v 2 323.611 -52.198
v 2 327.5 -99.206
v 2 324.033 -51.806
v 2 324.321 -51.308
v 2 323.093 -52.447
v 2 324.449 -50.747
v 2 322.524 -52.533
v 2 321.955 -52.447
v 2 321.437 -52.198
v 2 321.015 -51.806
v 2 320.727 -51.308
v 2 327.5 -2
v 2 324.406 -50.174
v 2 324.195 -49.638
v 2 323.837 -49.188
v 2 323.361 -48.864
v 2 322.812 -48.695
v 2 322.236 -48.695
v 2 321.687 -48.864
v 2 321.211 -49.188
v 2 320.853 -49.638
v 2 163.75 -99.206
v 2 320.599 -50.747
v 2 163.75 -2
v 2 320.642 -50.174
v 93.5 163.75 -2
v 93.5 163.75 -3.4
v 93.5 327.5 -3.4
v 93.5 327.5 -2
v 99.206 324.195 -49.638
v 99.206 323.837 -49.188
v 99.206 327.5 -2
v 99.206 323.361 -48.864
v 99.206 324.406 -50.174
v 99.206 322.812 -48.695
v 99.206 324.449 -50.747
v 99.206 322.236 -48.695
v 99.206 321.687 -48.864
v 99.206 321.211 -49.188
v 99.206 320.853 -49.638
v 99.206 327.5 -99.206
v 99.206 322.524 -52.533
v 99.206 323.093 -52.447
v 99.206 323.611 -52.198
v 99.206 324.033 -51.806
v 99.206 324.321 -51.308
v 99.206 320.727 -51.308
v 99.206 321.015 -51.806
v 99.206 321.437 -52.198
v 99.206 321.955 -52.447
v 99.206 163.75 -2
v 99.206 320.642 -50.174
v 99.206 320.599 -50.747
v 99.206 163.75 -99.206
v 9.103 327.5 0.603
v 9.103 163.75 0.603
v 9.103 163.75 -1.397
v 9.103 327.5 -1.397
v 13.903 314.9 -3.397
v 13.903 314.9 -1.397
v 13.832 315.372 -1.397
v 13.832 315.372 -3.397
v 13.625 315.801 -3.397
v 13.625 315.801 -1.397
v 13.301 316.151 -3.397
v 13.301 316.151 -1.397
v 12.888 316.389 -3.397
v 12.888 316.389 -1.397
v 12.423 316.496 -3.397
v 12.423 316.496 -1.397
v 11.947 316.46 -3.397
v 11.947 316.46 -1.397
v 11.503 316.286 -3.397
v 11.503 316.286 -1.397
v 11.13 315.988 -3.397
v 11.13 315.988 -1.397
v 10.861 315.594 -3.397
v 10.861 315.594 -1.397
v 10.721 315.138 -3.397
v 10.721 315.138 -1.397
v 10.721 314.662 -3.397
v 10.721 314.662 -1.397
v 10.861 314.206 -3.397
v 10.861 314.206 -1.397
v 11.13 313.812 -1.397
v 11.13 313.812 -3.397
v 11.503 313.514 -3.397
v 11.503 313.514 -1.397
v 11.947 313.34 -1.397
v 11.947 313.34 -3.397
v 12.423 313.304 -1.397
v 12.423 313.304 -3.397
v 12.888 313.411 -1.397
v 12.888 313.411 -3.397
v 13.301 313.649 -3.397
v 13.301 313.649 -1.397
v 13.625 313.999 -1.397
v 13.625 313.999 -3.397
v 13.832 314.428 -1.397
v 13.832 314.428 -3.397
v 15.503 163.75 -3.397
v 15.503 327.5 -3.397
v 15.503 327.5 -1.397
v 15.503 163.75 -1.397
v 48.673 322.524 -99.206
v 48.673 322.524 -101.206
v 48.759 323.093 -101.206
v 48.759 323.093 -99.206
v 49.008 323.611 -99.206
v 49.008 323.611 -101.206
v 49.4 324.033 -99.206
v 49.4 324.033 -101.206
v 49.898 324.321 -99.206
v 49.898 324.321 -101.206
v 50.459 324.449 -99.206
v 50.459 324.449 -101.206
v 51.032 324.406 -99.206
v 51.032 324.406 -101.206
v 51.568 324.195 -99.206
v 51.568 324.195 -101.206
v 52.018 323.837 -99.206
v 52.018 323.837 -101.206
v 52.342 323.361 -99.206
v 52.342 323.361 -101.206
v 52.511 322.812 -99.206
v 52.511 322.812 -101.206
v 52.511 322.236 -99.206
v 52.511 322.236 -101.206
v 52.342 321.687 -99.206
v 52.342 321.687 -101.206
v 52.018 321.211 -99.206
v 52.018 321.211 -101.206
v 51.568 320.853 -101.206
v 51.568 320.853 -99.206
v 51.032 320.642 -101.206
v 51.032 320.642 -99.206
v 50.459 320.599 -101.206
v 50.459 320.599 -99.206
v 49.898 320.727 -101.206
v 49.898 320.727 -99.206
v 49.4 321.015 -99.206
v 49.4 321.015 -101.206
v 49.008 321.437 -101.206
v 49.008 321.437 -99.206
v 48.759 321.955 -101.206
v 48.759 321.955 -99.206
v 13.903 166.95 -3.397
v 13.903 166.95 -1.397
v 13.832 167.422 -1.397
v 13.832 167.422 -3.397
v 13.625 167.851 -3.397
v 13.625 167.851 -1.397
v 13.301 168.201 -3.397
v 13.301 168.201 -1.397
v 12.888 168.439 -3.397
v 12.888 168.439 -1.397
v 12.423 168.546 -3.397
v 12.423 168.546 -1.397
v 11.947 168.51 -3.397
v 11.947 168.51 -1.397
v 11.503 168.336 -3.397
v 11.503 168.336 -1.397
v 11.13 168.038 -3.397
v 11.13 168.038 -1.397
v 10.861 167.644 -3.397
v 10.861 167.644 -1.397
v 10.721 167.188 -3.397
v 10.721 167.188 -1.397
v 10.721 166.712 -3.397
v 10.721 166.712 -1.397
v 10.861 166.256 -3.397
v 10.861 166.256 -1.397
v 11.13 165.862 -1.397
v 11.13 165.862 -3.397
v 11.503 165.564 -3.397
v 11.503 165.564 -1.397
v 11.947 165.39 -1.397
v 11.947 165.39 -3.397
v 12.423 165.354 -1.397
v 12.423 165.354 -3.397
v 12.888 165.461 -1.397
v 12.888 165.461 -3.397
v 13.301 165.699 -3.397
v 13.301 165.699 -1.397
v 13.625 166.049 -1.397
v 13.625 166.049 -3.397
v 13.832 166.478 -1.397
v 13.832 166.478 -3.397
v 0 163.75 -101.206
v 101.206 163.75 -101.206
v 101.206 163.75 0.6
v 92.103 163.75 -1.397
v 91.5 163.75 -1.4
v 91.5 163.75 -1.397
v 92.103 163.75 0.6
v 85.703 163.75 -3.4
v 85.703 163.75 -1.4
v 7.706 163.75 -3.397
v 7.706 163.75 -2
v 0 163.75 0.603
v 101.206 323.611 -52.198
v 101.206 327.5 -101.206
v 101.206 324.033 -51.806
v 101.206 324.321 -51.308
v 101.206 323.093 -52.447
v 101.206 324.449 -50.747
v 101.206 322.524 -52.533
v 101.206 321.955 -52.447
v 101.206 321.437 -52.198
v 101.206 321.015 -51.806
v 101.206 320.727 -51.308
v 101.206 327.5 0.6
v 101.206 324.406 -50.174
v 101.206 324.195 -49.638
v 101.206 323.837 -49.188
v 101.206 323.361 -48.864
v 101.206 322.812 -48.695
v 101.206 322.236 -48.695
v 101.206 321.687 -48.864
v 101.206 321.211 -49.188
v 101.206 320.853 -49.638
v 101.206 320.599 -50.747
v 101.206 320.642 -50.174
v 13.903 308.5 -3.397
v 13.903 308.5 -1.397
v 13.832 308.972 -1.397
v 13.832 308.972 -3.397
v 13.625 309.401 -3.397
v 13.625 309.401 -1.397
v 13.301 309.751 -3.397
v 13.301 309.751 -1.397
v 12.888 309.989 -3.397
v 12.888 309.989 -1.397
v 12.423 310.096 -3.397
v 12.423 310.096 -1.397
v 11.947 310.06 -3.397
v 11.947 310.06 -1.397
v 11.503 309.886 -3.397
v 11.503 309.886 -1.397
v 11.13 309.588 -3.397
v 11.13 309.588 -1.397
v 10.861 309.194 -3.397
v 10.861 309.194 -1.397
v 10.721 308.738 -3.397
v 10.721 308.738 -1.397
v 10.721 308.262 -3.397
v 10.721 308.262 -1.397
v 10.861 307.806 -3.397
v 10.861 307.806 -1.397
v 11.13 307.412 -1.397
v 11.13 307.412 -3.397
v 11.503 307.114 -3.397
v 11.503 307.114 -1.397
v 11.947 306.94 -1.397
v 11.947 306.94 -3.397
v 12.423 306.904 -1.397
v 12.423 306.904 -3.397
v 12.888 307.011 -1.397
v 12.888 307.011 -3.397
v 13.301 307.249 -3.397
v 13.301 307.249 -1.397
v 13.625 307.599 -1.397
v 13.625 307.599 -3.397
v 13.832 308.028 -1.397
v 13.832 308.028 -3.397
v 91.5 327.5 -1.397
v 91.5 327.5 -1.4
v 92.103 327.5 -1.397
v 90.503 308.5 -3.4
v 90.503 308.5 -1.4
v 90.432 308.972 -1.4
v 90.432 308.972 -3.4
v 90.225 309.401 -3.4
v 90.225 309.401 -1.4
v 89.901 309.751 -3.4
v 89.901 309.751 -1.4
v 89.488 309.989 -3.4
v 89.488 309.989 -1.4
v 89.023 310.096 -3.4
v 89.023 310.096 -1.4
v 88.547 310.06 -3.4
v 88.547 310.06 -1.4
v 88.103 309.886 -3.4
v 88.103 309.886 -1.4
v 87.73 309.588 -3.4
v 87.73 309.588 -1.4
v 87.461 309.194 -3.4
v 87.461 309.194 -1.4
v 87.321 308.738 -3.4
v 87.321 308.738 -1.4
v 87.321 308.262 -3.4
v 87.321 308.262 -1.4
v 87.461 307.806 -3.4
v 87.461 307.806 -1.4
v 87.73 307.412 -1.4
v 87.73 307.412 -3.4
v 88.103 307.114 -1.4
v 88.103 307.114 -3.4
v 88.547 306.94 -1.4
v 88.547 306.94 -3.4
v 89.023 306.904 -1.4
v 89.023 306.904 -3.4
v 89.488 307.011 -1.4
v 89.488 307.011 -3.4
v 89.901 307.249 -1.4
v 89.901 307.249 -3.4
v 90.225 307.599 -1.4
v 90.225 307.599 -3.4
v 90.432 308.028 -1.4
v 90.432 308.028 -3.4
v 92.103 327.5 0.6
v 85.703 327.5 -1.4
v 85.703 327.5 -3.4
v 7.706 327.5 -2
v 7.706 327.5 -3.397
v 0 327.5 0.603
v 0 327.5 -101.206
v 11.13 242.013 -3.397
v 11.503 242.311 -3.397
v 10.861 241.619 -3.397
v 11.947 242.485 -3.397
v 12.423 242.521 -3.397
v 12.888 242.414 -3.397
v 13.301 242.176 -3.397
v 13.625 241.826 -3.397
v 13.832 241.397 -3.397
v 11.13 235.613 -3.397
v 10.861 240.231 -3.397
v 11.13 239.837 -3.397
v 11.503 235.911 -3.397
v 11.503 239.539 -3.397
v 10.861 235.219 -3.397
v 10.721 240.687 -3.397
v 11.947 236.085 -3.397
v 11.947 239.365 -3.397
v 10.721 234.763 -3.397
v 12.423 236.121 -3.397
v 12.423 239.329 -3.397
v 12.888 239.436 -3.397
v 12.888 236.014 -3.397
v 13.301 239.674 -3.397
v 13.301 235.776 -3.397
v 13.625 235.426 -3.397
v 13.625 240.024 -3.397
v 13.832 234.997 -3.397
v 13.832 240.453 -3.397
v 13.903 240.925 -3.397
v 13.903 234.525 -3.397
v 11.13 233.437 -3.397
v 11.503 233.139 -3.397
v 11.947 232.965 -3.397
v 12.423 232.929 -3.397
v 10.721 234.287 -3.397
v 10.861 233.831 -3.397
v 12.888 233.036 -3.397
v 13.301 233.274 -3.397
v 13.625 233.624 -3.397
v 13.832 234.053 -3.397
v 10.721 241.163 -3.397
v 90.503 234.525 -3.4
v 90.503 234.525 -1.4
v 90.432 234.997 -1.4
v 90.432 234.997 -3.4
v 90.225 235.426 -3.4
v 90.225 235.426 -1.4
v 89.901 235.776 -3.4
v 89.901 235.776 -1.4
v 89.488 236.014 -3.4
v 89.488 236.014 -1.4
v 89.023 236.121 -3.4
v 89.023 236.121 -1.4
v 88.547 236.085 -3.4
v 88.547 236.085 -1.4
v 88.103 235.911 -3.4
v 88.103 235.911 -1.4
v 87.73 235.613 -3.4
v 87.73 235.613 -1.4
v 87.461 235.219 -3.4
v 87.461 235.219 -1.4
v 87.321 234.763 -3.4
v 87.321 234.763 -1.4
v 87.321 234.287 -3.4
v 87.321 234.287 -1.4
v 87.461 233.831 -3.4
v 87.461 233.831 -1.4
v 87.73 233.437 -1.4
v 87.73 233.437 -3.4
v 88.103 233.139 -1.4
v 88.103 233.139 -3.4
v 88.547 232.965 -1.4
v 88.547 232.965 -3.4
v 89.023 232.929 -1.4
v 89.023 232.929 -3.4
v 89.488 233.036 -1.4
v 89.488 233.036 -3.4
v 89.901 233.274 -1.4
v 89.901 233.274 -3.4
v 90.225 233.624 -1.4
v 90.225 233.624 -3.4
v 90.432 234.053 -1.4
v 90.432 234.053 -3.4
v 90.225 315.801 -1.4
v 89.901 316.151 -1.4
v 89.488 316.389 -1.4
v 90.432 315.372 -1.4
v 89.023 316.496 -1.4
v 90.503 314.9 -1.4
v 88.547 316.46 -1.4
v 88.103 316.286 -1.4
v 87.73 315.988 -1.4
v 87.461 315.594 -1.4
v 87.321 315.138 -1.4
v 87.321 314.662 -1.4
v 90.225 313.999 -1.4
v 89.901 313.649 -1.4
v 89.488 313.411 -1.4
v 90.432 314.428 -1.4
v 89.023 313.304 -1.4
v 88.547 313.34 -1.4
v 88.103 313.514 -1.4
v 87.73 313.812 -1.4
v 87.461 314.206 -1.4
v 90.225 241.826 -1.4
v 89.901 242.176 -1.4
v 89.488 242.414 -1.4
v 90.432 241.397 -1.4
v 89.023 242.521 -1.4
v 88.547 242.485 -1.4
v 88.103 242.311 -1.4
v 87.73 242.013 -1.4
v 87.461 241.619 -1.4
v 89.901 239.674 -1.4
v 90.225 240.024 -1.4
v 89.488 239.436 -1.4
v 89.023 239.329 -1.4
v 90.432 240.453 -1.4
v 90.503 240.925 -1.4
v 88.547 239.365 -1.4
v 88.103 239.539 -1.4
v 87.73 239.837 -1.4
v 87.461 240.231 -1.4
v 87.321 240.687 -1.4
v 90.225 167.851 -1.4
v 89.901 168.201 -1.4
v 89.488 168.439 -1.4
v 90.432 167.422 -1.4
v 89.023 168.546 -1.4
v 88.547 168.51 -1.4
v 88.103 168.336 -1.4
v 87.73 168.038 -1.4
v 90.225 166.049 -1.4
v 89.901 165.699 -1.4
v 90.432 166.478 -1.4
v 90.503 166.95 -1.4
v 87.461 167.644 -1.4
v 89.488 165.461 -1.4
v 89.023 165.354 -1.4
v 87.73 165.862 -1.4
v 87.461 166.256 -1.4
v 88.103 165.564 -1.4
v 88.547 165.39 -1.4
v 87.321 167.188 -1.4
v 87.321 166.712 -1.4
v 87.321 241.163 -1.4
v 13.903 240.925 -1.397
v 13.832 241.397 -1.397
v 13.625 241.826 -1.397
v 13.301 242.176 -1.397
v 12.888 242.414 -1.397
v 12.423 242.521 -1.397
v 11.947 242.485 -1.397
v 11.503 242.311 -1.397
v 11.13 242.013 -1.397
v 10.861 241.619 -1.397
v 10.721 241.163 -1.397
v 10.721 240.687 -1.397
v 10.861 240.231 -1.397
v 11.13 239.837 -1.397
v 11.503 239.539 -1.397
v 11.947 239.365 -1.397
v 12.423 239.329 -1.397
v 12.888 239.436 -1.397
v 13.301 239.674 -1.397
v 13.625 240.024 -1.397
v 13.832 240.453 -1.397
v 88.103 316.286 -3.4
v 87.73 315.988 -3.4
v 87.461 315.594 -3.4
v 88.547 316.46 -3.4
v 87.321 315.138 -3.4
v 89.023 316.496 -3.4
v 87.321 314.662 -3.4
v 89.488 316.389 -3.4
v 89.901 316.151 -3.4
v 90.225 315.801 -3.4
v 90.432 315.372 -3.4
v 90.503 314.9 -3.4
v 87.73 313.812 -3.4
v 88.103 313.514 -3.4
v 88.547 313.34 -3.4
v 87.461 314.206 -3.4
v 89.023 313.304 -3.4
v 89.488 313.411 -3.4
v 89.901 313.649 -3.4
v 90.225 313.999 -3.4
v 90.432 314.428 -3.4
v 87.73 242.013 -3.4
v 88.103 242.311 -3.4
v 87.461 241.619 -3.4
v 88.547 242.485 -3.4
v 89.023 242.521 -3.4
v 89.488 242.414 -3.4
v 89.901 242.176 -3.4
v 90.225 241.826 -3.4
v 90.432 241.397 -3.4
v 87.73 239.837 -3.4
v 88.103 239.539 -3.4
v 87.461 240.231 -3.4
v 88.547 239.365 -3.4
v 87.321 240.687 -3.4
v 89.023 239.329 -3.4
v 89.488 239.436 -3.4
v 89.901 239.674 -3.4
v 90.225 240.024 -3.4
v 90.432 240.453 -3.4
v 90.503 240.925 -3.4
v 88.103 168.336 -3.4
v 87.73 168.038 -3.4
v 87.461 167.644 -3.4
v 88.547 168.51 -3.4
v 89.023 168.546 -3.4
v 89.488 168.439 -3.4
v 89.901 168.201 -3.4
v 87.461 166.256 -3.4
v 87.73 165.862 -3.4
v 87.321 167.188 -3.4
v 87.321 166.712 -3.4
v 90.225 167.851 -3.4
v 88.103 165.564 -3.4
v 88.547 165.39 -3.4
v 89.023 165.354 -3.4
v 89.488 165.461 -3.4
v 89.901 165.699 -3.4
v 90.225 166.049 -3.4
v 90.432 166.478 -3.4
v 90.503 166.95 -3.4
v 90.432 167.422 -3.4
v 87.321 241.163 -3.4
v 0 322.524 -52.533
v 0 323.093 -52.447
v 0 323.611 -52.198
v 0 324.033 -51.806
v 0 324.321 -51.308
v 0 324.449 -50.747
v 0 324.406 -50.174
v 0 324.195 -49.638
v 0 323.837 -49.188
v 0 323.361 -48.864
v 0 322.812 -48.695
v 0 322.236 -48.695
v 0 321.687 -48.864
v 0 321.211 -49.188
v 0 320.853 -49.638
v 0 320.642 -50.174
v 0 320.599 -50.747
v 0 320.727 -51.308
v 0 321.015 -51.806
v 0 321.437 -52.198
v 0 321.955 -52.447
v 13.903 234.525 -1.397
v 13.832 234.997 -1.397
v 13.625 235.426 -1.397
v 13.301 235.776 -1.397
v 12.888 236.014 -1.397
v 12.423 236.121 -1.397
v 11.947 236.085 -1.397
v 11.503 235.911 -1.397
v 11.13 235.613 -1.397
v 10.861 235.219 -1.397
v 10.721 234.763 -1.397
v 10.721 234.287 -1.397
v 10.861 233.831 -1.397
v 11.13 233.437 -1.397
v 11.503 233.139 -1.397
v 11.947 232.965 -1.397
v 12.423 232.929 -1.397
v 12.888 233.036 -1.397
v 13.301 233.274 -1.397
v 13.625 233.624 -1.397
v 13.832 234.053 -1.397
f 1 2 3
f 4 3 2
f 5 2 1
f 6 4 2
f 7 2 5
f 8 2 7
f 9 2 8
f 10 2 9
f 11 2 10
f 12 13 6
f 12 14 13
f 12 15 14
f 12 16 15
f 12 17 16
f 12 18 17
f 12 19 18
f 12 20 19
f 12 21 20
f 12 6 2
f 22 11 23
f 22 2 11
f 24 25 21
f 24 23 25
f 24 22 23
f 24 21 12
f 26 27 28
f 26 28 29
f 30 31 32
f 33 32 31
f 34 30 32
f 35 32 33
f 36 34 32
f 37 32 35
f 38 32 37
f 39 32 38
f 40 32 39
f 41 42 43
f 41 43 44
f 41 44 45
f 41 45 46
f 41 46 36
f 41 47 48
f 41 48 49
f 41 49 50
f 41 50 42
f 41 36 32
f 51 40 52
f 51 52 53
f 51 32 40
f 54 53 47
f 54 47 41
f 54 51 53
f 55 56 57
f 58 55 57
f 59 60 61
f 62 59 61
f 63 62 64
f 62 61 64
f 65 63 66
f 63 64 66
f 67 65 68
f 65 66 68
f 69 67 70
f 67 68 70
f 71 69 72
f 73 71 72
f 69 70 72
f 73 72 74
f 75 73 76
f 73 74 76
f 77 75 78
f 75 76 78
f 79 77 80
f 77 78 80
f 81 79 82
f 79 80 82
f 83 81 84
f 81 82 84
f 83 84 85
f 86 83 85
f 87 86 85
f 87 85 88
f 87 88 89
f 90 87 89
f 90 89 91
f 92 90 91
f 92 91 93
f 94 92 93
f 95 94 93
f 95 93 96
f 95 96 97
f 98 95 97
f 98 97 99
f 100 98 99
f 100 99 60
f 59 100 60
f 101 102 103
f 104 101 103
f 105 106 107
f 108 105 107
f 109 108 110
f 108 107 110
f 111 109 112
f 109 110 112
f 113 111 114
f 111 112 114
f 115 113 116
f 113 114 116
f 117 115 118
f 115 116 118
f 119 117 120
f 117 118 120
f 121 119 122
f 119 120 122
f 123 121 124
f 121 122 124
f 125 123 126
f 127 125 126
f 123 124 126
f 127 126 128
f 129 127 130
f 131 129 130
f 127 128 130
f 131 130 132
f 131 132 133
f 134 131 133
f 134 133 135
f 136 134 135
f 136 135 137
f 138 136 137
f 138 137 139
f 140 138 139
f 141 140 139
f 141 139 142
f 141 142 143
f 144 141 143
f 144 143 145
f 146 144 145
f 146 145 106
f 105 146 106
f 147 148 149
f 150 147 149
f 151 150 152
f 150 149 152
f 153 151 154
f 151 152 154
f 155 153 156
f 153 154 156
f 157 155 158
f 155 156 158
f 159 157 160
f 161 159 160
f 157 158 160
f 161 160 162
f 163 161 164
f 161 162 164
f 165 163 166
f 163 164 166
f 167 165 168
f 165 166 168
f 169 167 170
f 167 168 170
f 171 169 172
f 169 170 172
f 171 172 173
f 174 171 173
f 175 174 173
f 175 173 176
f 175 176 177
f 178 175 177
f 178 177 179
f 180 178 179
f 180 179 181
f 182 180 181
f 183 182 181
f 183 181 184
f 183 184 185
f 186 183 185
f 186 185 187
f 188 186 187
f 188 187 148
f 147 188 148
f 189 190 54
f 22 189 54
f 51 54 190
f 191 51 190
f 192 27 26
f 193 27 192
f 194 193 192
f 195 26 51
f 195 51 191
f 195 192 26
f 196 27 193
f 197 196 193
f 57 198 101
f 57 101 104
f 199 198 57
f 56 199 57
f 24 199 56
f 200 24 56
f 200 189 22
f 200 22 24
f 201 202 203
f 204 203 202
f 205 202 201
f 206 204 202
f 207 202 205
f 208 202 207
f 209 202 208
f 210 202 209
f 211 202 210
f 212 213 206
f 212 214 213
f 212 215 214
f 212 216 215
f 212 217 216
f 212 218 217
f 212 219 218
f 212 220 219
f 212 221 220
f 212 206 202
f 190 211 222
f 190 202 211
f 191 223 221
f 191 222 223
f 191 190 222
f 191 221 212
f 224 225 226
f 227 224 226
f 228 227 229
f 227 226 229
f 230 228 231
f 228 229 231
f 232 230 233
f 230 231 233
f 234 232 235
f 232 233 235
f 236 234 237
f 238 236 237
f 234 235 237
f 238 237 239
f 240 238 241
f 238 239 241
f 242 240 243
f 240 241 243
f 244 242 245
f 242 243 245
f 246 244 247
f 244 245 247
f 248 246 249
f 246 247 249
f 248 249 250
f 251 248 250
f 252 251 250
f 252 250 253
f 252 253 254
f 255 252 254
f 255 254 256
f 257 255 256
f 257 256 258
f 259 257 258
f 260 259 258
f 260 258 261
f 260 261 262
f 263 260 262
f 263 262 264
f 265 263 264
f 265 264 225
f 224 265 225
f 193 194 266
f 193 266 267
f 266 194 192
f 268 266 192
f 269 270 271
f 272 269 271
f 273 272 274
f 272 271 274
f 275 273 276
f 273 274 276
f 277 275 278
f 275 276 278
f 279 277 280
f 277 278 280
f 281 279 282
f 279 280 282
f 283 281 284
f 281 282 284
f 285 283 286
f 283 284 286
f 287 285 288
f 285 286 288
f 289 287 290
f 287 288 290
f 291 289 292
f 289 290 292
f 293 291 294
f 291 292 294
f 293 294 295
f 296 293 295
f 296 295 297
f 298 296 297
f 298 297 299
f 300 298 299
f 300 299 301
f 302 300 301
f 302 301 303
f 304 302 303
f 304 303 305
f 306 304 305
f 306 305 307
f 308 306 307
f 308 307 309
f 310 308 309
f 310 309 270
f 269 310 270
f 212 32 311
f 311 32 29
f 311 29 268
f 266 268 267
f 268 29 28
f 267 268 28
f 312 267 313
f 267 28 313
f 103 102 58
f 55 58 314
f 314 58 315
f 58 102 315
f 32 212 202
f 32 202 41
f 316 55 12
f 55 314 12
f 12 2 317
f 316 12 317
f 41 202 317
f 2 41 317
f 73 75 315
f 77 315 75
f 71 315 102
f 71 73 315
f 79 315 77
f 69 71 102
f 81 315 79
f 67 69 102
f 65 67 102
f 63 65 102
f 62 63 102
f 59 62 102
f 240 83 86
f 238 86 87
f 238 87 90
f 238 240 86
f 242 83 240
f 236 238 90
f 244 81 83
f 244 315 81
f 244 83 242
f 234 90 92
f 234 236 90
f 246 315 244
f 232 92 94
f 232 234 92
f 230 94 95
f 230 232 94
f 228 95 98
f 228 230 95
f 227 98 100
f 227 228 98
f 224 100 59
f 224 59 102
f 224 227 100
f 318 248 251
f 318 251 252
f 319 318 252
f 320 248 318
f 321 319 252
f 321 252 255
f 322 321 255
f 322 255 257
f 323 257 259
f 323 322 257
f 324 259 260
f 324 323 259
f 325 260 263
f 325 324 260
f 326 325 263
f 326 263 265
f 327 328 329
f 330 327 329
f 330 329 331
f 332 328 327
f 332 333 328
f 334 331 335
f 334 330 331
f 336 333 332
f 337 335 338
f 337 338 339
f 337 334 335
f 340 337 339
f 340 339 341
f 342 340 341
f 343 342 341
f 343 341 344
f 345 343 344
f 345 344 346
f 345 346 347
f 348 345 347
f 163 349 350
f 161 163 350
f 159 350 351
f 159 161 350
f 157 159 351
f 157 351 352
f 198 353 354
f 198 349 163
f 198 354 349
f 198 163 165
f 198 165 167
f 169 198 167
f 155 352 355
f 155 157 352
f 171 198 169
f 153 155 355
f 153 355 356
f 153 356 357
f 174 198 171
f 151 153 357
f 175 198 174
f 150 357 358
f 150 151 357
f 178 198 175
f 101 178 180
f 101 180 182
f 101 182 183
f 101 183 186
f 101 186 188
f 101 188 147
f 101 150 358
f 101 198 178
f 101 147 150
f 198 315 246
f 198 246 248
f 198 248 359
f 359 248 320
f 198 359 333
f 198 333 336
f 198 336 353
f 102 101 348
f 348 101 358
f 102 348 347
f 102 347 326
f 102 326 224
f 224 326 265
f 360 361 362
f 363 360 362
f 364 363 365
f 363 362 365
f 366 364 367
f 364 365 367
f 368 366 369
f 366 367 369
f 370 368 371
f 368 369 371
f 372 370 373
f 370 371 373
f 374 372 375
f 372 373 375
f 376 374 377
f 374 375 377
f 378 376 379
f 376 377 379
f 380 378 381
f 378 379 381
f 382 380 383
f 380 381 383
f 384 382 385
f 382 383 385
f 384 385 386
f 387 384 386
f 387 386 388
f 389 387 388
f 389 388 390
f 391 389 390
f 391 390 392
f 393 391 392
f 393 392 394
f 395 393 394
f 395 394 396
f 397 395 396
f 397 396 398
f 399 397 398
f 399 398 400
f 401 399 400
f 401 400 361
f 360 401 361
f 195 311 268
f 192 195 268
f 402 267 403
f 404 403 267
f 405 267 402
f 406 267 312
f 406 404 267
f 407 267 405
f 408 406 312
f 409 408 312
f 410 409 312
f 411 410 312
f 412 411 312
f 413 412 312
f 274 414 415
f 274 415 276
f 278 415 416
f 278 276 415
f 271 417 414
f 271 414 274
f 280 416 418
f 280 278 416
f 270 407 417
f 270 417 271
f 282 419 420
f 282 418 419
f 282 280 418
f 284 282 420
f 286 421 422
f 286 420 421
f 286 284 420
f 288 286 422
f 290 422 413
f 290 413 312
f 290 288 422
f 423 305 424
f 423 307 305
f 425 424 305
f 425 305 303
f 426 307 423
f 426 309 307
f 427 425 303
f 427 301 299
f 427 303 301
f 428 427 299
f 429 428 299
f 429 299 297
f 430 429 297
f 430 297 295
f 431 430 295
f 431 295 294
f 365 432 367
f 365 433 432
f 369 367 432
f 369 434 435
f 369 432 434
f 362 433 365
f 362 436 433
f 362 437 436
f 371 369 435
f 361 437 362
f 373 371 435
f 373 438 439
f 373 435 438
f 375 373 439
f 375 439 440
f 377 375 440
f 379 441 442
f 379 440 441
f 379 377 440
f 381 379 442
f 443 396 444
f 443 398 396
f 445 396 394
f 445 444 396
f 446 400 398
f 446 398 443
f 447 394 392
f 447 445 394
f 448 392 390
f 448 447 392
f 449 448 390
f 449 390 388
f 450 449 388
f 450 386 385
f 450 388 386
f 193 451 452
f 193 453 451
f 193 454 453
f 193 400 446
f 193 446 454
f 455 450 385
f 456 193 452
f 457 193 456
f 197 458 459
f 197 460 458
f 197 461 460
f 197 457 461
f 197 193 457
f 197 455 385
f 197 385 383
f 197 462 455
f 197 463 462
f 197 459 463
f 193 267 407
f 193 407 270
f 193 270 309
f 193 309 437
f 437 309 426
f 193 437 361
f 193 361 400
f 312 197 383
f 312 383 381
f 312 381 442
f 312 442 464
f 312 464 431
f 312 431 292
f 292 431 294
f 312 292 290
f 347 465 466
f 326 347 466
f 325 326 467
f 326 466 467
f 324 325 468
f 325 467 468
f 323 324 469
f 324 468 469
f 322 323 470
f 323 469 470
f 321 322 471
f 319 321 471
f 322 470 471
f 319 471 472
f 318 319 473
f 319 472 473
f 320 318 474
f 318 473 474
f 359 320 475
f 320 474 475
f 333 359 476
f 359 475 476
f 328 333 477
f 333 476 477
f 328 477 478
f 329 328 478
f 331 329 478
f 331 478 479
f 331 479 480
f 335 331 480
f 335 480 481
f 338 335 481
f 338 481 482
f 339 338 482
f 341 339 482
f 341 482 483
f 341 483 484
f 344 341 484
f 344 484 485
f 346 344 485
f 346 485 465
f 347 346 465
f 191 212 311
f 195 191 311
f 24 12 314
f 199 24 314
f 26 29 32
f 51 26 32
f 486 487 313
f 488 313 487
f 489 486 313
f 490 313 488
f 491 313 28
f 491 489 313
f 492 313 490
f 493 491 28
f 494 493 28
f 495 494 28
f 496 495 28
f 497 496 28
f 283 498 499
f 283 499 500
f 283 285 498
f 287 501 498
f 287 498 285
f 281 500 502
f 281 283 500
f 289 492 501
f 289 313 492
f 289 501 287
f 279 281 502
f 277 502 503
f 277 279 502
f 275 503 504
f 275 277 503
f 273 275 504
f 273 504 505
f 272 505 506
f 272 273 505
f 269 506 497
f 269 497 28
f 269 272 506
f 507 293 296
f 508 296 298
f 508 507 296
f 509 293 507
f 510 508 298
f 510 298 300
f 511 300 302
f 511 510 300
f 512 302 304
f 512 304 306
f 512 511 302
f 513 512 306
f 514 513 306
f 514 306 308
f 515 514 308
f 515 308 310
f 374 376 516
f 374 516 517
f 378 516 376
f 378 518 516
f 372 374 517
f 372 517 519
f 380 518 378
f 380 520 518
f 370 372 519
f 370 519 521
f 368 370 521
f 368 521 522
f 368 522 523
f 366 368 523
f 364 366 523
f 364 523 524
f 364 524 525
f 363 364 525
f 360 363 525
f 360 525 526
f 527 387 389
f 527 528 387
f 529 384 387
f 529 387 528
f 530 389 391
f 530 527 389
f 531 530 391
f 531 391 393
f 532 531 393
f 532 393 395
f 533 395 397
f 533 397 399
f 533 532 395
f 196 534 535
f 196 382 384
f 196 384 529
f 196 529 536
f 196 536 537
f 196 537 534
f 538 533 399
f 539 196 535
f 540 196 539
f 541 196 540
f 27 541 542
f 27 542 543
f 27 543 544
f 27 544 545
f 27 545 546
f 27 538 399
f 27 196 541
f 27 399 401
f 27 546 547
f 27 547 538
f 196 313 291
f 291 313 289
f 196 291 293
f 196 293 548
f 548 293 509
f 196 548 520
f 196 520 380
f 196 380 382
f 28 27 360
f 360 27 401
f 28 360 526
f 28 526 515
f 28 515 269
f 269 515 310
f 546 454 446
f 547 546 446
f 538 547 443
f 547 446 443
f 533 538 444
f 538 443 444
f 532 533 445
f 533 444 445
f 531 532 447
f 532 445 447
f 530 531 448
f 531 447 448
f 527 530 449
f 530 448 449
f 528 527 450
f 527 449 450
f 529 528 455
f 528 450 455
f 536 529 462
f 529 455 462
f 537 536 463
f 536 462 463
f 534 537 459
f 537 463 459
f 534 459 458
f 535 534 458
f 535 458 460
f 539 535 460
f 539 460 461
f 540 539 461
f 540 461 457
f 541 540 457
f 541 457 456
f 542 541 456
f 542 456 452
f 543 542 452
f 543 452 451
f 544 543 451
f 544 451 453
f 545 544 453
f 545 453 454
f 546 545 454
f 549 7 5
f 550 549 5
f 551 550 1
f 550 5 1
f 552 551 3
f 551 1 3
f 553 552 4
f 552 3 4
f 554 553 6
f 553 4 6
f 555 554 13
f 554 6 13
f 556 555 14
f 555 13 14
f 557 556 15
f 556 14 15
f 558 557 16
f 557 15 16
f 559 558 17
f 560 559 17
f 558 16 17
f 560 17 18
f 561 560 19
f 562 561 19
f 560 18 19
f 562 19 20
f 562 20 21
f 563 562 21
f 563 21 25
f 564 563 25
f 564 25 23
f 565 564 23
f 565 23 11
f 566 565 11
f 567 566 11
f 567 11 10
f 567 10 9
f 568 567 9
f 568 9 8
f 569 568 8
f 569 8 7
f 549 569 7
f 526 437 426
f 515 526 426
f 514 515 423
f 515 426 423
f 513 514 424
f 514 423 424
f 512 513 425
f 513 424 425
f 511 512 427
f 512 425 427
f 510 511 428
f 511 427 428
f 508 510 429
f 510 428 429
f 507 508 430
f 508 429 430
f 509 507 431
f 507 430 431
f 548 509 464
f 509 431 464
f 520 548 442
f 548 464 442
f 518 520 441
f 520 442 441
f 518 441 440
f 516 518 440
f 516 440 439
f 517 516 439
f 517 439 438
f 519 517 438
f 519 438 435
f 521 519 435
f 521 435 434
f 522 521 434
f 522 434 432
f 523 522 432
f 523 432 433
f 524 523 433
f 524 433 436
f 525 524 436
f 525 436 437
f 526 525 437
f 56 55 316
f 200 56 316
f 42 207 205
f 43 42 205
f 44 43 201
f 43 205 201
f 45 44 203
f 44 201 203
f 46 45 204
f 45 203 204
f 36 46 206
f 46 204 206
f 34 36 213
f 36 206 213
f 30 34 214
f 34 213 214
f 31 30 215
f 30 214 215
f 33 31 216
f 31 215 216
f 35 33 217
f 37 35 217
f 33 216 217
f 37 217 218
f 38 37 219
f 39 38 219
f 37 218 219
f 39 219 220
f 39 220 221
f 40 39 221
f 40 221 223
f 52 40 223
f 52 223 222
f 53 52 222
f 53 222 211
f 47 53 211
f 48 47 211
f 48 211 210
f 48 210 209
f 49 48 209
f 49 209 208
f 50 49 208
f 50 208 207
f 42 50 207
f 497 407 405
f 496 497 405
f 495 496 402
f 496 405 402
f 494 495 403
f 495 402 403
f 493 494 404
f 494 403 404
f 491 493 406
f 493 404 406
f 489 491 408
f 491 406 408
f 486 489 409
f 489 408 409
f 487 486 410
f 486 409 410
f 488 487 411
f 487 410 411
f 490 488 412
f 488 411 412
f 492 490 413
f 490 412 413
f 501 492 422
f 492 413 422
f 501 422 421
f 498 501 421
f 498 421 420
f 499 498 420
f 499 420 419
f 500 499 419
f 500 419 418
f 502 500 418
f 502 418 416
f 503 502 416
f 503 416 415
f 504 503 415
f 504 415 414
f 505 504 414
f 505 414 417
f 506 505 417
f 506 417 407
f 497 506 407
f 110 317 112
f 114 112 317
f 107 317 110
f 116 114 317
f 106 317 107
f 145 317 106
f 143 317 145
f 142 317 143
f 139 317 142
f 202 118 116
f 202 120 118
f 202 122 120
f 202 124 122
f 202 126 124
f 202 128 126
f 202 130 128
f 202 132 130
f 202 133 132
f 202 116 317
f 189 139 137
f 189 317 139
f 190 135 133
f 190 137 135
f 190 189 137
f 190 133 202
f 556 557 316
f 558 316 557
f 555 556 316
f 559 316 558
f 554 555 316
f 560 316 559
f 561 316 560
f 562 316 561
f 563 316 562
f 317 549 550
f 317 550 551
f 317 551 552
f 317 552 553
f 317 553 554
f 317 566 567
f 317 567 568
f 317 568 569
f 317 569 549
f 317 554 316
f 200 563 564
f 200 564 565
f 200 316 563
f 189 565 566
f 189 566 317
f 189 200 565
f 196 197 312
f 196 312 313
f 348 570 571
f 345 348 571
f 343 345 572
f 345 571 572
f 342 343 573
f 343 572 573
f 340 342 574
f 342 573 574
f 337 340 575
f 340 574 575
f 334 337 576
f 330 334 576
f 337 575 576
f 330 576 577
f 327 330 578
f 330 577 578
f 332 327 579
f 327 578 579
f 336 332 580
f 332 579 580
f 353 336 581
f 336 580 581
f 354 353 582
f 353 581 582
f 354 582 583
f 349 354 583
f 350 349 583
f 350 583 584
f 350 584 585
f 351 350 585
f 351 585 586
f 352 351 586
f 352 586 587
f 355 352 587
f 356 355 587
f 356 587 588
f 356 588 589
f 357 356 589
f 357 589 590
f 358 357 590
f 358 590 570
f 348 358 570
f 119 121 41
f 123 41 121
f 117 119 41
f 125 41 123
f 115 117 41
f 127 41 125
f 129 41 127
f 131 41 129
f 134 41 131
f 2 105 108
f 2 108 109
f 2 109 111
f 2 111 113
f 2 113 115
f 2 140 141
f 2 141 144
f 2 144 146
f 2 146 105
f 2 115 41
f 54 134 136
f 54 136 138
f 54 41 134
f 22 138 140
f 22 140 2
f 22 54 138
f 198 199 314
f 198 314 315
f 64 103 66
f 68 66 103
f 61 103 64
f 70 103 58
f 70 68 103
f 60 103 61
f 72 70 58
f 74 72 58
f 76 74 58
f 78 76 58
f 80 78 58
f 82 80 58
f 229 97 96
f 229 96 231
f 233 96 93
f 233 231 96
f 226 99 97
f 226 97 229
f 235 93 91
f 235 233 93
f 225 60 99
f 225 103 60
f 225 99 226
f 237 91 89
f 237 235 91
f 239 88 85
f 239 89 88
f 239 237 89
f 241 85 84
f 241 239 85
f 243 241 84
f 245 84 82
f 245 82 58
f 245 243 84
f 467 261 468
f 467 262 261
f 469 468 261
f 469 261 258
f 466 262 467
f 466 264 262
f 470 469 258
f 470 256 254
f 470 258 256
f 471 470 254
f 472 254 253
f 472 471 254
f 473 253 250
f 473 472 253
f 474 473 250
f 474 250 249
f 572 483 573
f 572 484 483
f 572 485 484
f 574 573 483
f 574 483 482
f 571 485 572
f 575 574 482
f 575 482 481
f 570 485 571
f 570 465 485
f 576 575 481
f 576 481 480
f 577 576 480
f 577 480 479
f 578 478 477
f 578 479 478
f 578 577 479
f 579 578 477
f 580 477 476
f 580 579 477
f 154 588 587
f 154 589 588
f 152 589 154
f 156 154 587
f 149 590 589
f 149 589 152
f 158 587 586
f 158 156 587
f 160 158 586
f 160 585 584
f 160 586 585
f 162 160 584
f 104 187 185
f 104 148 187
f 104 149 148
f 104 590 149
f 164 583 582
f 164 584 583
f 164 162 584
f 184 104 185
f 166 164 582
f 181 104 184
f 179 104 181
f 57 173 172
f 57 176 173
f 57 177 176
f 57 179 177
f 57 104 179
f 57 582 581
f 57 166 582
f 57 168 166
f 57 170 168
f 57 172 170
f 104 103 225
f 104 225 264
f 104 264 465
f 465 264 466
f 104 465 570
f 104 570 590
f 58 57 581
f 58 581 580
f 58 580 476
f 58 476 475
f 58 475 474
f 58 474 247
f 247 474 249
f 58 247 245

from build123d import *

# Parameters (mm, degrees)
BOSS_EXTRUDE1_DEPTH = 327.5
SKETCH7_W           = 83
SKETCH7_H           = 2
CUT_EXTRUDE7_DEPTH  = 203
SKETCH2_R           = 1.6
CUT_EXTRUDE2_DEPTH  = 10
SKETCH3_R           = 1.93
CUT_EXTRUDE3_DEPTH  = 102
SKETCH4_R           = 1.93
CUT_EXTRUDE4_DEPTH  = 10
SKETCH5_W           = 130.251709281
SKETCH5_H           = 163.75
CUT_EXTRUDE6_DEPTH  = 231


with BuildPart() as part:
    # Sketch1 → Boss-Extrude1 (new body)
    with BuildSketch(Plane(origin=(0, 0, 0), x_dir=(1, 0, 0), z_dir=(0, 1, 0))):
        Polygon((0, -0.603), (0, 101.206), (101.206, 101.206), (101.206, -0.6), (91.5, -0.6), (91.5, 1.4), (85.703, 1.4), (85.703, 3.4), (93.5, 3.4), (93.5, 2), (99.206, 2), (99.206, 99.206), (2, 99.206), (2, 2), (7.706, 2), (7.706, 3.397), (15.503, 3.397), (15.503, 1.397), (9.706, 1.397), (9.706, -0.603), align=None)
    extrude(amount=BOSS_EXTRUDE1_DEPTH)

    # Sketch7 → Cut-Extrude7 (cut)
    with BuildSketch(Plane(origin=(0, 327.5, 0), x_dir=(1, 0, 0), z_dir=(0, 1, 0))):
        with Locations((50.603, 0.397)):
            Rectangle(SKETCH7_W, SKETCH7_H)
    extrude(amount=-CUT_EXTRUDE7_DEPTH, mode=Mode.SUBTRACT)

    # Sketch2 → Cut-Extrude2 (cut)
    with BuildSketch(Plane.XY.offset(-1.397)):
        with Locations((12.303, 314.9)):
            Circle(SKETCH2_R)
        with Locations((12.303, 308.5)):
            Circle(SKETCH2_R)
        with Locations((88.903, 314.9)):
            Circle(SKETCH2_R)
        with Locations((88.903, 308.5)):
            Circle(SKETCH2_R)
        with Locations((12.303, 240.925)):
            Circle(SKETCH2_R)
        with Locations((12.303, 234.525)):
            Circle(SKETCH2_R)
        with Locations((88.903, 240.925)):
            Circle(SKETCH2_R)
        with Locations((88.903, 234.525)):
            Circle(SKETCH2_R)
        with Locations((12.303, 166.95)):
            Circle(SKETCH2_R)
        with Locations((12.303, 160.55)):
            Circle(SKETCH2_R)
        with Locations((88.903, 166.95)):
            Circle(SKETCH2_R)
        with Locations((88.903, 160.55)):
            Circle(SKETCH2_R)
        with Locations((12.303, 92.975)):
            Circle(SKETCH2_R)
        with Locations((12.303, 86.575)):
            Circle(SKETCH2_R)
        with Locations((88.903, 92.975)):
            Circle(SKETCH2_R)
        with Locations((88.903, 86.575)):
            Circle(SKETCH2_R)
        with Locations((12.303, 19)):
            Circle(SKETCH2_R)
        with Locations((12.303, 12.6)):
            Circle(SKETCH2_R)
        with Locations((88.903, 19)):
            Circle(SKETCH2_R)
        with Locations((88.903, 12.6)):
            Circle(SKETCH2_R)
    extrude(amount=-CUT_EXTRUDE2_DEPTH, mode=Mode.SUBTRACT)

    # Sketch3 → Cut-Extrude3 (cut)
    with BuildSketch(Plane(origin=(101.206, 0, 0), x_dir=(0, 0, -1), z_dir=(1, 0, 0))):
        with Locations((50.603, 322.524)):
            Circle(SKETCH3_R)
        with Locations((50.603, 4.976)):
            Circle(SKETCH3_R)
    extrude(amount=-CUT_EXTRUDE3_DEPTH, mode=Mode.SUBTRACT)

    # Sketch4 → Cut-Extrude4 (cut)
    with BuildSketch(Plane(origin=(0, 0, -101.206), x_dir=(-1, 0, 0), z_dir=(0, 0, -1))):
        with Locations((-50.603, 322.524)):
            Circle(SKETCH4_R)
        with Locations((-50.603, 4.976)):
            Circle(SKETCH4_R)
    extrude(amount=-CUT_EXTRUDE4_DEPTH, mode=Mode.SUBTRACT)

    # Sketch5 → Cut-Extrude6 (cut)
    with BuildSketch(Plane.ZY):
        with Locations((-36.08014536, 81.875)):
            Rectangle(SKETCH5_W, SKETCH5_H)
    extrude(amount=-CUT_EXTRUDE6_DEPTH, mode=Mode.SUBTRACT)


solid = part.part
